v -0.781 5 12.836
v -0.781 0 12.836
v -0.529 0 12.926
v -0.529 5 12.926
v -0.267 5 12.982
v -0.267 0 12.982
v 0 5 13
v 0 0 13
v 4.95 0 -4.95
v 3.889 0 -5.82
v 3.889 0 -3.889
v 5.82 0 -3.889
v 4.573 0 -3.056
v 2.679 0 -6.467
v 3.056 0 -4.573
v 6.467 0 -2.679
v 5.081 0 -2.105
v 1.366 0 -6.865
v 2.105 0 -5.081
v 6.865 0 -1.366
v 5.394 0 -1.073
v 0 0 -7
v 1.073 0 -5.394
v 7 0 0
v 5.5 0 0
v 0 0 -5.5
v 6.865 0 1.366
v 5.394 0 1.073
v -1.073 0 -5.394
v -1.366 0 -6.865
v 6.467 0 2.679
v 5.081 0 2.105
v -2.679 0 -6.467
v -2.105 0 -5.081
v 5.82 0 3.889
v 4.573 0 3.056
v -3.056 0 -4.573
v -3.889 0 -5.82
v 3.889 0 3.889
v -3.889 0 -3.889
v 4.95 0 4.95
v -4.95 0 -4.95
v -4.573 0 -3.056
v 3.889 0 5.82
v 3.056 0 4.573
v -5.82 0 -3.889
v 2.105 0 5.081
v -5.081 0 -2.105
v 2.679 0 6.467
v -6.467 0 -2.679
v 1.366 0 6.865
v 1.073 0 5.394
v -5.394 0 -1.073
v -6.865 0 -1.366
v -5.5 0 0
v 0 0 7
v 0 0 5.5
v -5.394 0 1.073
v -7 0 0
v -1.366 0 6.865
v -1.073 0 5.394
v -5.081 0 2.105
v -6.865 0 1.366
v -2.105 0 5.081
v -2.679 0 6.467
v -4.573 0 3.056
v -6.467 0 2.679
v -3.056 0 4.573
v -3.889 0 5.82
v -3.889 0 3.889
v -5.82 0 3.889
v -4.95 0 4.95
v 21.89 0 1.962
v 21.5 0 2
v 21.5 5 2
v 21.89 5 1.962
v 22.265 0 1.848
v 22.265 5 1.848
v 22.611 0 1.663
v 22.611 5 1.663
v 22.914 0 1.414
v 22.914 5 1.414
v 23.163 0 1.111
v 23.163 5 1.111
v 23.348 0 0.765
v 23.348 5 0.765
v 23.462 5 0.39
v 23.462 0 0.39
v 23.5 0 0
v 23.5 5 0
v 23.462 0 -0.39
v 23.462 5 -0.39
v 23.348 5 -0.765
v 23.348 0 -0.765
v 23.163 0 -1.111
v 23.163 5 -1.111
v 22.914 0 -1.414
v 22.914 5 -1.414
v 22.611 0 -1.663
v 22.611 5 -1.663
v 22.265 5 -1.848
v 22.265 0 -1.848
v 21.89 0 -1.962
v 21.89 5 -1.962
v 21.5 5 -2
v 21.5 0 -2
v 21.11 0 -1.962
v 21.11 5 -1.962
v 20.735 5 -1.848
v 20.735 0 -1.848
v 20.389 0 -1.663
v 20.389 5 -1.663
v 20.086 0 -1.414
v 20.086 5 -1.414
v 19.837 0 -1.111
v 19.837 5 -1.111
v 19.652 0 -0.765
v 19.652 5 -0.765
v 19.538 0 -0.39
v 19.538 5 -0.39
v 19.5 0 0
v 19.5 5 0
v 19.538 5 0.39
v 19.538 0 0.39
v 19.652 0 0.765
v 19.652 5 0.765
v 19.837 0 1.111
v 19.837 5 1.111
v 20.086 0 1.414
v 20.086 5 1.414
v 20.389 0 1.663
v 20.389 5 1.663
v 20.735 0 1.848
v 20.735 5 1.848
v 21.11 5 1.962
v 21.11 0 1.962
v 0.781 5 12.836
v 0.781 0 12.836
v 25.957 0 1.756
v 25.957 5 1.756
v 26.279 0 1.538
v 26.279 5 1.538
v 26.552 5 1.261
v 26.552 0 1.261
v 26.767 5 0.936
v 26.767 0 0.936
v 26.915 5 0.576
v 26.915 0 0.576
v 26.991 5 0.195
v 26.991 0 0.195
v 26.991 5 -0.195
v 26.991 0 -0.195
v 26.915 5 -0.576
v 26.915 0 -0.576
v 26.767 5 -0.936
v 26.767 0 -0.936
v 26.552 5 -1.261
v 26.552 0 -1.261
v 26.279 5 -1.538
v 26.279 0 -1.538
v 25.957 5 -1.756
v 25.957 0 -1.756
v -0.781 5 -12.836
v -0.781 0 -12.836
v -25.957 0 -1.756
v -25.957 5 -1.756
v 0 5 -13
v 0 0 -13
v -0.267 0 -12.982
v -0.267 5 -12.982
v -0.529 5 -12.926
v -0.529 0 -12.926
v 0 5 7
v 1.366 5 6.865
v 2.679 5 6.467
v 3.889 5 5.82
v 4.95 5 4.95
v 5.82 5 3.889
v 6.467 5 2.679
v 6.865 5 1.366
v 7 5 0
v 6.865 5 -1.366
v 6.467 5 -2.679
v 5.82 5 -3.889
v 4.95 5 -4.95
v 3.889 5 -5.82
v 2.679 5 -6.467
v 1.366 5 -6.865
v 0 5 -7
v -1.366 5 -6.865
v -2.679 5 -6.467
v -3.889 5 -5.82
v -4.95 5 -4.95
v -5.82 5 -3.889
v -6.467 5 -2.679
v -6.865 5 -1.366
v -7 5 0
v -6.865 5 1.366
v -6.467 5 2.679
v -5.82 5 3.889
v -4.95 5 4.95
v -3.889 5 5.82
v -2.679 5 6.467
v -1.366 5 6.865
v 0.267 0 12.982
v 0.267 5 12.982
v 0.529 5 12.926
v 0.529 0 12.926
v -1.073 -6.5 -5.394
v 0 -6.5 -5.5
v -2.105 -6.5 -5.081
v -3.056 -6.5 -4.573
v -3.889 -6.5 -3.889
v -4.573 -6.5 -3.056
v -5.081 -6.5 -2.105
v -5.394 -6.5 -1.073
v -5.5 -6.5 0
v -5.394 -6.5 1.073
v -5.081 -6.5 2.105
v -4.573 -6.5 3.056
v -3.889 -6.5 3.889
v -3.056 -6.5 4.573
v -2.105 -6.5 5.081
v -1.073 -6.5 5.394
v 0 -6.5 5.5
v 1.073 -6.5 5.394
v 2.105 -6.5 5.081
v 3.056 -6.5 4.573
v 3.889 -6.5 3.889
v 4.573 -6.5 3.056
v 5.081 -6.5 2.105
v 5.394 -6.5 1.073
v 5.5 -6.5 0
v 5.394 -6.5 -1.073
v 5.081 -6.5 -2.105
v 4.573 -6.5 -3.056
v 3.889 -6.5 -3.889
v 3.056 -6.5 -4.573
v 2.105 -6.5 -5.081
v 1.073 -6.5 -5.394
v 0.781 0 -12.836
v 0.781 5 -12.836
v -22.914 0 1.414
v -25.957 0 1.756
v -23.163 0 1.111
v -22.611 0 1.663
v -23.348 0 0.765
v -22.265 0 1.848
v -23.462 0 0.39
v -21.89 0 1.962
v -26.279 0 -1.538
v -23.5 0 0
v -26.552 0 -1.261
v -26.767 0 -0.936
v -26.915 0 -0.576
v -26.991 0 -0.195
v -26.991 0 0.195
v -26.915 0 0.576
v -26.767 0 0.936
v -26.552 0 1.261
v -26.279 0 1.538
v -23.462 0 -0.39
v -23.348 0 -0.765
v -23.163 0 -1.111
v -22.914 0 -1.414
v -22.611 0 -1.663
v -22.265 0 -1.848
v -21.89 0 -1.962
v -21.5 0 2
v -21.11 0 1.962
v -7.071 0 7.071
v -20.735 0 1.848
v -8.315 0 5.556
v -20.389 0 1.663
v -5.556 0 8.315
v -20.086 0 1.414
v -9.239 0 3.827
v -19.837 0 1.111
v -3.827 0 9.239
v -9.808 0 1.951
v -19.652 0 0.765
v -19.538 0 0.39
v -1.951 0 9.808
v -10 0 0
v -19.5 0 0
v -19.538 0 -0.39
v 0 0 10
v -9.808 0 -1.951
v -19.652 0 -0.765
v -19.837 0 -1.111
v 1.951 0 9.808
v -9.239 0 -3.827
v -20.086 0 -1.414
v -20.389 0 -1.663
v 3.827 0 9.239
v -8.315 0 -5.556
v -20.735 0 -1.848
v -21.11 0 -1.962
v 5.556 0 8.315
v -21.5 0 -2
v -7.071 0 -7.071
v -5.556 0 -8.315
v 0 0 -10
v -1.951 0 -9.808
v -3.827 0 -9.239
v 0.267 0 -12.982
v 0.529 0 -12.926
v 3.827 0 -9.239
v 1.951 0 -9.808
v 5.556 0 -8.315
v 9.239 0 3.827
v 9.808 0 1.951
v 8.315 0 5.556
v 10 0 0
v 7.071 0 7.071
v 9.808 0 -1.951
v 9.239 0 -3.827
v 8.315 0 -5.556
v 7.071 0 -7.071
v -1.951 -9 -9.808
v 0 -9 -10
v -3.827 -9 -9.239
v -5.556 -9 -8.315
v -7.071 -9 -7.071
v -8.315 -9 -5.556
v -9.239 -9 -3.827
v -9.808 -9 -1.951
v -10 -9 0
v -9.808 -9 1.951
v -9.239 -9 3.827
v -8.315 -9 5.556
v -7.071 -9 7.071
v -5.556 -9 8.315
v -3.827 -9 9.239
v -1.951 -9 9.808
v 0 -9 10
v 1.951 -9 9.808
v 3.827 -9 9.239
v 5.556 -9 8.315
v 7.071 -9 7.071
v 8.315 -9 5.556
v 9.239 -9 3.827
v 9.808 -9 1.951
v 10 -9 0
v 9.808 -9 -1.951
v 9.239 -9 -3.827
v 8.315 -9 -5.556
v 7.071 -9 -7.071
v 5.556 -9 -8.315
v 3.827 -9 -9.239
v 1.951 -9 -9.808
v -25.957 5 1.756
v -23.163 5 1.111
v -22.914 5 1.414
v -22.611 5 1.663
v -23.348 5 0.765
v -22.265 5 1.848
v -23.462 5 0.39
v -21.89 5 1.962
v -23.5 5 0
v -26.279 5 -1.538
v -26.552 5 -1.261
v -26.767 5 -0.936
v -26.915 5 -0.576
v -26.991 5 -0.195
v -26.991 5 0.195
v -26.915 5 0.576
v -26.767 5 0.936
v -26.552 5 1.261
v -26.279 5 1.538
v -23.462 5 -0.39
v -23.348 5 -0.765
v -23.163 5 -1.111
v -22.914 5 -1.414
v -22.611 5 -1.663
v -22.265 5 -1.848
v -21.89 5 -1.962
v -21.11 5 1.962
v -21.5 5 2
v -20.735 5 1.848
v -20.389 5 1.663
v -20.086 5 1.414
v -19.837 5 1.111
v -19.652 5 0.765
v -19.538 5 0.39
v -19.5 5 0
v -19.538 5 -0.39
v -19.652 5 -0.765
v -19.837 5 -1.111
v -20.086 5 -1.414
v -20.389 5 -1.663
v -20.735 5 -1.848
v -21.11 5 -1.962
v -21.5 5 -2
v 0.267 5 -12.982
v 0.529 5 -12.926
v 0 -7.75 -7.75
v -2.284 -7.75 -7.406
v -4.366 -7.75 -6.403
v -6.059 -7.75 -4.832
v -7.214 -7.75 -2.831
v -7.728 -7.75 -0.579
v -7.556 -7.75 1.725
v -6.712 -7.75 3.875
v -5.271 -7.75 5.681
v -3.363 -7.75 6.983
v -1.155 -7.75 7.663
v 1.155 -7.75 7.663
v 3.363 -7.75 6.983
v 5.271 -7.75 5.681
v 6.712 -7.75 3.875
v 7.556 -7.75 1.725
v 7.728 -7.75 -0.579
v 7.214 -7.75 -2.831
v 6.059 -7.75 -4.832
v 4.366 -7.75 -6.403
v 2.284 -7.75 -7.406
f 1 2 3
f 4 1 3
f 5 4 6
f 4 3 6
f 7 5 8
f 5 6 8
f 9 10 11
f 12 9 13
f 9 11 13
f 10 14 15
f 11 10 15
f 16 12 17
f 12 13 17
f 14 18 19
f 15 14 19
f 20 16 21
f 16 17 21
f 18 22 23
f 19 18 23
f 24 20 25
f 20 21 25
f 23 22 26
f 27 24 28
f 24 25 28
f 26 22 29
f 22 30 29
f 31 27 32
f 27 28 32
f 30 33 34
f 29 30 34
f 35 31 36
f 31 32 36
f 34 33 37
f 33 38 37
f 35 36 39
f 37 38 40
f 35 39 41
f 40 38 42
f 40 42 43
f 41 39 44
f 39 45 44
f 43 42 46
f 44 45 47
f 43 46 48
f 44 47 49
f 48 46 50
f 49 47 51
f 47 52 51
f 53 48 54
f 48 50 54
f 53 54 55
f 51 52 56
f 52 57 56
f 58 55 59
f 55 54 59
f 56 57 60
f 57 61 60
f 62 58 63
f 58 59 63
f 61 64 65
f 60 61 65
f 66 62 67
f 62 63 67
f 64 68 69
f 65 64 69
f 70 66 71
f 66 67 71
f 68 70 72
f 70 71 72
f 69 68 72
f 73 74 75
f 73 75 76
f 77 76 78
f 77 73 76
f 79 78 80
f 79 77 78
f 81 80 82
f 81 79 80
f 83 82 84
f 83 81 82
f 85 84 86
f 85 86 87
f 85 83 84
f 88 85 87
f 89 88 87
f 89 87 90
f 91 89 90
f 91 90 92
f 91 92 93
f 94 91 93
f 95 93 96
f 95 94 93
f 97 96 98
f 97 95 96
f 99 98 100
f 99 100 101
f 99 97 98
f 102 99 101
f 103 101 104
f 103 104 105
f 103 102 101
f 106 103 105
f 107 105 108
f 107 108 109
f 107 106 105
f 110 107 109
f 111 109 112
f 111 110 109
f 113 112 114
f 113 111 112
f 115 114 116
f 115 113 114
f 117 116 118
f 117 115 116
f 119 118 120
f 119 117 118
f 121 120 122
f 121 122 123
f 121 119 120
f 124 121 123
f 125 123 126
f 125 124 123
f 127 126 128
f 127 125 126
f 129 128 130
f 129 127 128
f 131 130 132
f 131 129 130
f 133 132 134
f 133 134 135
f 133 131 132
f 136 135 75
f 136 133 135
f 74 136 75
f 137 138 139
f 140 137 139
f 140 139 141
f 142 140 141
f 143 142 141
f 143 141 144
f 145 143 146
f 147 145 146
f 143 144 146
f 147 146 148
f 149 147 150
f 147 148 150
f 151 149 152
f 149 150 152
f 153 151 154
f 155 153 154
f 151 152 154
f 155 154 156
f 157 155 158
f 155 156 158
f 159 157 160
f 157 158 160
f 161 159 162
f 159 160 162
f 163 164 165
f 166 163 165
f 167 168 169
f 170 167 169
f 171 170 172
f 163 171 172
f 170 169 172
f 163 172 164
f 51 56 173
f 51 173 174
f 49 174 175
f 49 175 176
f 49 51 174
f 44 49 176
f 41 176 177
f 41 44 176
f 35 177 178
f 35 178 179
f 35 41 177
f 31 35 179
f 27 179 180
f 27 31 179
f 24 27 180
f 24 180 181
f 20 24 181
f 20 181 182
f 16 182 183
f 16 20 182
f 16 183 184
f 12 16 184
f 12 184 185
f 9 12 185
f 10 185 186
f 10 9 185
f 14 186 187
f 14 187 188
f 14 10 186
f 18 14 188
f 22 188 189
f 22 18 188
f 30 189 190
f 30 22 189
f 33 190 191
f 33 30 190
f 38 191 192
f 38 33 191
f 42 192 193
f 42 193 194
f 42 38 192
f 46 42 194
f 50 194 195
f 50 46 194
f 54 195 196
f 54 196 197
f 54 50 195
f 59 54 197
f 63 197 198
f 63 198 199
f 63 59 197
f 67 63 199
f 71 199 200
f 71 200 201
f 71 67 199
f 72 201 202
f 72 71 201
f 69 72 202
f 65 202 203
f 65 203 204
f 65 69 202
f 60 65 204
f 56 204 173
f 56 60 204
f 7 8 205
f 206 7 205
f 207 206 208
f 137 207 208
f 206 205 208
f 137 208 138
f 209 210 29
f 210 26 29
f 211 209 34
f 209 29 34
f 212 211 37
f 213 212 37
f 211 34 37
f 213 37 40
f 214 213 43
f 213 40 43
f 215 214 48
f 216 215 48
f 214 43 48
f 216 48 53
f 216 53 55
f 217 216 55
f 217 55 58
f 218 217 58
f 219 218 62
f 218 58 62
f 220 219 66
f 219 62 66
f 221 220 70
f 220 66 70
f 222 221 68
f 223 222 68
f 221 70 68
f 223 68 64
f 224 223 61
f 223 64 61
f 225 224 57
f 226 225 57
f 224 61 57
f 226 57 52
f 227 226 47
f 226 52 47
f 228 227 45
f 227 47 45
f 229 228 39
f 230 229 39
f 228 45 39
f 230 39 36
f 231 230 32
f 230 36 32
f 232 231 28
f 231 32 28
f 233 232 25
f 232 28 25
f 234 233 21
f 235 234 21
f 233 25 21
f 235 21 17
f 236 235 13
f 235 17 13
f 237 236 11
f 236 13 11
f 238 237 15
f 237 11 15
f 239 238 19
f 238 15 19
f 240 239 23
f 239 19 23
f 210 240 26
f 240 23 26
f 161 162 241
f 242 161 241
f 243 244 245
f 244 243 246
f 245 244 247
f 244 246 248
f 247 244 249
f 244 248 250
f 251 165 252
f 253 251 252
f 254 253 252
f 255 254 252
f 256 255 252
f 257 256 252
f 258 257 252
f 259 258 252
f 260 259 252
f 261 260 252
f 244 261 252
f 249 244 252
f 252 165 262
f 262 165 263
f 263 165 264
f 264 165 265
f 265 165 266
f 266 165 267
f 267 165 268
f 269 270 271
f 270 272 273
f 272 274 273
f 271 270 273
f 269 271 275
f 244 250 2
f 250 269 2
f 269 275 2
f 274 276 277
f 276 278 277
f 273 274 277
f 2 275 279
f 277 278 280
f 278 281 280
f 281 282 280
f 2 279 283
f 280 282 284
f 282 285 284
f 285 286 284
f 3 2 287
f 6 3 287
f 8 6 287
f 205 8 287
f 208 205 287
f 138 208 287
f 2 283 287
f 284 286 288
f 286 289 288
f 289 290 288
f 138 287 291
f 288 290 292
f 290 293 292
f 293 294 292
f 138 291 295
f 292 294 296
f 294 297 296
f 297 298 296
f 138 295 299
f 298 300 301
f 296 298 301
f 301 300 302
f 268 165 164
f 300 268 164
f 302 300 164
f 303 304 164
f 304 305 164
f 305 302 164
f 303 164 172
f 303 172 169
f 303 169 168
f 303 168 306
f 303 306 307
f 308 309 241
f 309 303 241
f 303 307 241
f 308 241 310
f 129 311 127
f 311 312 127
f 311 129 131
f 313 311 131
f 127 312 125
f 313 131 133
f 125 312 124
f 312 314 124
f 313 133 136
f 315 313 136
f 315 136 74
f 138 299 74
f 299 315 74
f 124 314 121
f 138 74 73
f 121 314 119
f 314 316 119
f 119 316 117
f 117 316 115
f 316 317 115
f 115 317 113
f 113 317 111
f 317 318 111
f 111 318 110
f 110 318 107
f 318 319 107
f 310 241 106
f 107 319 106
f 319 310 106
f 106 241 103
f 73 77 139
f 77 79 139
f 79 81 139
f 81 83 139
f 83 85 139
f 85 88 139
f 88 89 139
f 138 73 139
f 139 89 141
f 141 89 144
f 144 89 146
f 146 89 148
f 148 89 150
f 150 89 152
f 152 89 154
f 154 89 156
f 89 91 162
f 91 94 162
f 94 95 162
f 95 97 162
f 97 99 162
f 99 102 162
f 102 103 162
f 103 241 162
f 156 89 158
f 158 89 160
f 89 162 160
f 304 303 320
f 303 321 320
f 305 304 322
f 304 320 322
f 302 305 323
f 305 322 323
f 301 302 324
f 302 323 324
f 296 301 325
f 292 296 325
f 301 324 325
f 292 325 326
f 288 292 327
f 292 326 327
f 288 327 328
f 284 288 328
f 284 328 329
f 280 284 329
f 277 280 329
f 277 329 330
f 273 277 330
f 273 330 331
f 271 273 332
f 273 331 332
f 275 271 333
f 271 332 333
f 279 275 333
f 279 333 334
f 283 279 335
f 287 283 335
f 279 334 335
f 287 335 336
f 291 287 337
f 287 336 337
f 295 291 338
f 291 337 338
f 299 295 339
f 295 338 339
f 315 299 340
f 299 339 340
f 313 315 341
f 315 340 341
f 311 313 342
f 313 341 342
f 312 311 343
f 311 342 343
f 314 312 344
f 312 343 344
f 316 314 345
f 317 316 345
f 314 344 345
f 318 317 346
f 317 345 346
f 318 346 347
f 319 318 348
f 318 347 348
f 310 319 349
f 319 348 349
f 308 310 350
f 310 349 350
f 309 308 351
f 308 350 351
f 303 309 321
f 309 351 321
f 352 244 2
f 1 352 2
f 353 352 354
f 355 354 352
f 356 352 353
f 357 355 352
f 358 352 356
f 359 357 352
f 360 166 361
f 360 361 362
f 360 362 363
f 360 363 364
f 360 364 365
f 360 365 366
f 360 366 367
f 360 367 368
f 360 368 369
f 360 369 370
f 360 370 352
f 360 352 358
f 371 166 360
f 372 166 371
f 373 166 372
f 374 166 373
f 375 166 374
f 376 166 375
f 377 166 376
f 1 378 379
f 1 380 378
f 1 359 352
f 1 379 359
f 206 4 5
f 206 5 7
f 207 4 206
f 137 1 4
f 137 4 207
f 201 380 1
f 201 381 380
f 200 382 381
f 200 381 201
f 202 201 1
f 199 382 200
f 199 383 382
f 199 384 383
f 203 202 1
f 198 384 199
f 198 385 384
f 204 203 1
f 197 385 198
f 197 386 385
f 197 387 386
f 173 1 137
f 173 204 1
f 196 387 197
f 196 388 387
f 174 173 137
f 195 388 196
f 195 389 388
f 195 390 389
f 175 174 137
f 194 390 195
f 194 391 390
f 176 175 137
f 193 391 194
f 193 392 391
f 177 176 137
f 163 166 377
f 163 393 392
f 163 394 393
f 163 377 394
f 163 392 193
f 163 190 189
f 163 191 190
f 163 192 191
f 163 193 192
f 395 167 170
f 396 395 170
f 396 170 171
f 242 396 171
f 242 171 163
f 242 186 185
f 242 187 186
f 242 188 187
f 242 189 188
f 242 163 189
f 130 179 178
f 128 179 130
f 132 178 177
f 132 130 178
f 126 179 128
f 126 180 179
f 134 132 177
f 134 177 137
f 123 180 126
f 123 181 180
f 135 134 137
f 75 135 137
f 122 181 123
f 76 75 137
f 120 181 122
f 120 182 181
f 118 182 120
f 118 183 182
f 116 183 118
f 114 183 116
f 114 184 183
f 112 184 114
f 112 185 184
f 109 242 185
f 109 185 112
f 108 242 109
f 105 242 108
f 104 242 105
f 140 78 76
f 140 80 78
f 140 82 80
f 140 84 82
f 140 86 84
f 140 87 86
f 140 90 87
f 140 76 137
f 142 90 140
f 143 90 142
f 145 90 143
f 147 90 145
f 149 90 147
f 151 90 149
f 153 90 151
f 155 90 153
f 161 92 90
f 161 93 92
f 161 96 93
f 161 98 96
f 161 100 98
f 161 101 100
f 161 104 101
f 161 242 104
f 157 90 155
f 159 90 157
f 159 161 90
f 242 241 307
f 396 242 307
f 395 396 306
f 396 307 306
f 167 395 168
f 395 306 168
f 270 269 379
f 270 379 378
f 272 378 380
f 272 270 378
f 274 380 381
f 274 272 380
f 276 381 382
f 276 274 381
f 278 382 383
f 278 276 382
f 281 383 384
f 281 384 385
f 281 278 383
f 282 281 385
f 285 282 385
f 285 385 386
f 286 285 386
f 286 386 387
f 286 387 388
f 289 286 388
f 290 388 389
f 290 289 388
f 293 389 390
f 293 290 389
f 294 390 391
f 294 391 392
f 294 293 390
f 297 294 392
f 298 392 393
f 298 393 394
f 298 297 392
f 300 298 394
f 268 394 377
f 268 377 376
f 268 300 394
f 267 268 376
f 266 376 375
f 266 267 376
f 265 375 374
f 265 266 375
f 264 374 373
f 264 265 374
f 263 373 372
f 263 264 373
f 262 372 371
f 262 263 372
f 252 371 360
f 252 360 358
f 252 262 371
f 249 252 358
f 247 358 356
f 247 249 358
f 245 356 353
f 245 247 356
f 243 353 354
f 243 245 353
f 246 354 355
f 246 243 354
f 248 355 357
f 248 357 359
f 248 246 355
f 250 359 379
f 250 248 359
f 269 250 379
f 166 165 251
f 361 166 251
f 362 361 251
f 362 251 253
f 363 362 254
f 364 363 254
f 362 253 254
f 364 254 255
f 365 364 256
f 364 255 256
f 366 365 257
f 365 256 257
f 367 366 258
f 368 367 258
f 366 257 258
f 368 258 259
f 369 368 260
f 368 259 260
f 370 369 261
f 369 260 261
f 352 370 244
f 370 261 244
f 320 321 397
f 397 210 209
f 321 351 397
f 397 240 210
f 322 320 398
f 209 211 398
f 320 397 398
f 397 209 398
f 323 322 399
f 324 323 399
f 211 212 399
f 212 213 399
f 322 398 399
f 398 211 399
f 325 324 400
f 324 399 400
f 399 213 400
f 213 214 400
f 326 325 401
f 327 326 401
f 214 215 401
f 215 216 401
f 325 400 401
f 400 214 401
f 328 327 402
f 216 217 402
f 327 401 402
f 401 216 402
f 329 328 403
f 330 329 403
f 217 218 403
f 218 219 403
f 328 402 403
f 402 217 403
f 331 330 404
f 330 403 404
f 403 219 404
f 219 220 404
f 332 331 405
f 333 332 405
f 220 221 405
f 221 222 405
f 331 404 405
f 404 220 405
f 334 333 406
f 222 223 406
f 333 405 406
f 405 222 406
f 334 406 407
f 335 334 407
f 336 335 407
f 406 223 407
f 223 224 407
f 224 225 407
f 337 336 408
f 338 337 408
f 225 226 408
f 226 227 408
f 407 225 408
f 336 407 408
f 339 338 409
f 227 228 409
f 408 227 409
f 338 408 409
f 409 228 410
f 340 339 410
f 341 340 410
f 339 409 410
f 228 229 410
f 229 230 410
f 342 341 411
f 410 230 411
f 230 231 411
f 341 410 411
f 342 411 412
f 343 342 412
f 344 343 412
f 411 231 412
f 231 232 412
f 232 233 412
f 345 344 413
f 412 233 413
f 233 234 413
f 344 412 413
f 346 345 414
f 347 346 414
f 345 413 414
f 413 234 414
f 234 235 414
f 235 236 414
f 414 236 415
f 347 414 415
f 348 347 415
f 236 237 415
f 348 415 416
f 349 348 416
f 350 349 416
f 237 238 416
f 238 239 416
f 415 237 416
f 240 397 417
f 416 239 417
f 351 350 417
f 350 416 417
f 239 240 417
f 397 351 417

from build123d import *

# Parameters (mm, degrees)
SKETCH3_R           = 7
SKETCH3_R_2         = 2
BOSS_EXTRUDE1_DEPTH = 5


with BuildPart() as part:
    # Sketch2 → Revolve1 (revolve)
    with BuildSketch(Plane.XY, mode=Mode.PRIVATE) as revolve1_sk:
        Polygon((5.5, 0), (10, 0), (10, -9), (5.5, -6.5), align=None)
    revolve(revolve1_sk.sketch.rotate(Axis((0, 0, 0), (0, 1, 0)), 90), axis=Axis((0, 0, 0), (0, 1, 0)))

    # Sketch3 → Boss-Extrude1 (add)
    with BuildSketch(Plane(origin=(0, 0, 0), x_dir=(1, 0, 0), z_dir=(0, 1, 0))):
        with BuildLine():
            Line((-0.780909149, 12.835767591), (-25.956866437, 1.756247881))
            ThreePointArc((-25.956866437, 1.756247881), (-27, 0), (-25.956866437, -1.756247881))
            Line((-25.956866437, -1.756247881), (-0.780909149, -12.835767591))
            ThreePointArc((-0.780909149, -12.835767591), (-0.398996047, -12.958497669), (0, -13))
            ThreePointArc((0, -13), (0.398996047, -12.958497669), (0.780909149, -12.835767591))
            Line((0.780909149, -12.835767591), (25.956866437, -1.756247881))
            ThreePointArc((25.956866437, -1.756247881), (27, 0), (25.956866437, 1.756247881))
            Line((25.956866437, 1.756247881), (0.780909149, 12.835767591))
            ThreePointArc((0.780909149, 12.835767591), (0.398996047, 12.958497669), (0, 13))
            ThreePointArc((0, 13), (-0.398996047, 12.958497669), (-0.780909149, 12.835767591))
        make_face()
        with Locations(Location((0, 0, 0), (0, 0, 270))):
            Circle(SKETCH3_R, mode=Mode.SUBTRACT)
        with Locations(Location((21.5, 0, 0), (0, 0, 270))):
            Circle(SKETCH3_R_2, mode=Mode.SUBTRACT)
        with Locations(Location((-21.5, 0, 0), (0, 0, 270))):
            Circle(SKETCH3_R_2, mode=Mode.SUBTRACT)
    extrude(amount=BOSS_EXTRUDE1_DEPTH)


solid = part.part
